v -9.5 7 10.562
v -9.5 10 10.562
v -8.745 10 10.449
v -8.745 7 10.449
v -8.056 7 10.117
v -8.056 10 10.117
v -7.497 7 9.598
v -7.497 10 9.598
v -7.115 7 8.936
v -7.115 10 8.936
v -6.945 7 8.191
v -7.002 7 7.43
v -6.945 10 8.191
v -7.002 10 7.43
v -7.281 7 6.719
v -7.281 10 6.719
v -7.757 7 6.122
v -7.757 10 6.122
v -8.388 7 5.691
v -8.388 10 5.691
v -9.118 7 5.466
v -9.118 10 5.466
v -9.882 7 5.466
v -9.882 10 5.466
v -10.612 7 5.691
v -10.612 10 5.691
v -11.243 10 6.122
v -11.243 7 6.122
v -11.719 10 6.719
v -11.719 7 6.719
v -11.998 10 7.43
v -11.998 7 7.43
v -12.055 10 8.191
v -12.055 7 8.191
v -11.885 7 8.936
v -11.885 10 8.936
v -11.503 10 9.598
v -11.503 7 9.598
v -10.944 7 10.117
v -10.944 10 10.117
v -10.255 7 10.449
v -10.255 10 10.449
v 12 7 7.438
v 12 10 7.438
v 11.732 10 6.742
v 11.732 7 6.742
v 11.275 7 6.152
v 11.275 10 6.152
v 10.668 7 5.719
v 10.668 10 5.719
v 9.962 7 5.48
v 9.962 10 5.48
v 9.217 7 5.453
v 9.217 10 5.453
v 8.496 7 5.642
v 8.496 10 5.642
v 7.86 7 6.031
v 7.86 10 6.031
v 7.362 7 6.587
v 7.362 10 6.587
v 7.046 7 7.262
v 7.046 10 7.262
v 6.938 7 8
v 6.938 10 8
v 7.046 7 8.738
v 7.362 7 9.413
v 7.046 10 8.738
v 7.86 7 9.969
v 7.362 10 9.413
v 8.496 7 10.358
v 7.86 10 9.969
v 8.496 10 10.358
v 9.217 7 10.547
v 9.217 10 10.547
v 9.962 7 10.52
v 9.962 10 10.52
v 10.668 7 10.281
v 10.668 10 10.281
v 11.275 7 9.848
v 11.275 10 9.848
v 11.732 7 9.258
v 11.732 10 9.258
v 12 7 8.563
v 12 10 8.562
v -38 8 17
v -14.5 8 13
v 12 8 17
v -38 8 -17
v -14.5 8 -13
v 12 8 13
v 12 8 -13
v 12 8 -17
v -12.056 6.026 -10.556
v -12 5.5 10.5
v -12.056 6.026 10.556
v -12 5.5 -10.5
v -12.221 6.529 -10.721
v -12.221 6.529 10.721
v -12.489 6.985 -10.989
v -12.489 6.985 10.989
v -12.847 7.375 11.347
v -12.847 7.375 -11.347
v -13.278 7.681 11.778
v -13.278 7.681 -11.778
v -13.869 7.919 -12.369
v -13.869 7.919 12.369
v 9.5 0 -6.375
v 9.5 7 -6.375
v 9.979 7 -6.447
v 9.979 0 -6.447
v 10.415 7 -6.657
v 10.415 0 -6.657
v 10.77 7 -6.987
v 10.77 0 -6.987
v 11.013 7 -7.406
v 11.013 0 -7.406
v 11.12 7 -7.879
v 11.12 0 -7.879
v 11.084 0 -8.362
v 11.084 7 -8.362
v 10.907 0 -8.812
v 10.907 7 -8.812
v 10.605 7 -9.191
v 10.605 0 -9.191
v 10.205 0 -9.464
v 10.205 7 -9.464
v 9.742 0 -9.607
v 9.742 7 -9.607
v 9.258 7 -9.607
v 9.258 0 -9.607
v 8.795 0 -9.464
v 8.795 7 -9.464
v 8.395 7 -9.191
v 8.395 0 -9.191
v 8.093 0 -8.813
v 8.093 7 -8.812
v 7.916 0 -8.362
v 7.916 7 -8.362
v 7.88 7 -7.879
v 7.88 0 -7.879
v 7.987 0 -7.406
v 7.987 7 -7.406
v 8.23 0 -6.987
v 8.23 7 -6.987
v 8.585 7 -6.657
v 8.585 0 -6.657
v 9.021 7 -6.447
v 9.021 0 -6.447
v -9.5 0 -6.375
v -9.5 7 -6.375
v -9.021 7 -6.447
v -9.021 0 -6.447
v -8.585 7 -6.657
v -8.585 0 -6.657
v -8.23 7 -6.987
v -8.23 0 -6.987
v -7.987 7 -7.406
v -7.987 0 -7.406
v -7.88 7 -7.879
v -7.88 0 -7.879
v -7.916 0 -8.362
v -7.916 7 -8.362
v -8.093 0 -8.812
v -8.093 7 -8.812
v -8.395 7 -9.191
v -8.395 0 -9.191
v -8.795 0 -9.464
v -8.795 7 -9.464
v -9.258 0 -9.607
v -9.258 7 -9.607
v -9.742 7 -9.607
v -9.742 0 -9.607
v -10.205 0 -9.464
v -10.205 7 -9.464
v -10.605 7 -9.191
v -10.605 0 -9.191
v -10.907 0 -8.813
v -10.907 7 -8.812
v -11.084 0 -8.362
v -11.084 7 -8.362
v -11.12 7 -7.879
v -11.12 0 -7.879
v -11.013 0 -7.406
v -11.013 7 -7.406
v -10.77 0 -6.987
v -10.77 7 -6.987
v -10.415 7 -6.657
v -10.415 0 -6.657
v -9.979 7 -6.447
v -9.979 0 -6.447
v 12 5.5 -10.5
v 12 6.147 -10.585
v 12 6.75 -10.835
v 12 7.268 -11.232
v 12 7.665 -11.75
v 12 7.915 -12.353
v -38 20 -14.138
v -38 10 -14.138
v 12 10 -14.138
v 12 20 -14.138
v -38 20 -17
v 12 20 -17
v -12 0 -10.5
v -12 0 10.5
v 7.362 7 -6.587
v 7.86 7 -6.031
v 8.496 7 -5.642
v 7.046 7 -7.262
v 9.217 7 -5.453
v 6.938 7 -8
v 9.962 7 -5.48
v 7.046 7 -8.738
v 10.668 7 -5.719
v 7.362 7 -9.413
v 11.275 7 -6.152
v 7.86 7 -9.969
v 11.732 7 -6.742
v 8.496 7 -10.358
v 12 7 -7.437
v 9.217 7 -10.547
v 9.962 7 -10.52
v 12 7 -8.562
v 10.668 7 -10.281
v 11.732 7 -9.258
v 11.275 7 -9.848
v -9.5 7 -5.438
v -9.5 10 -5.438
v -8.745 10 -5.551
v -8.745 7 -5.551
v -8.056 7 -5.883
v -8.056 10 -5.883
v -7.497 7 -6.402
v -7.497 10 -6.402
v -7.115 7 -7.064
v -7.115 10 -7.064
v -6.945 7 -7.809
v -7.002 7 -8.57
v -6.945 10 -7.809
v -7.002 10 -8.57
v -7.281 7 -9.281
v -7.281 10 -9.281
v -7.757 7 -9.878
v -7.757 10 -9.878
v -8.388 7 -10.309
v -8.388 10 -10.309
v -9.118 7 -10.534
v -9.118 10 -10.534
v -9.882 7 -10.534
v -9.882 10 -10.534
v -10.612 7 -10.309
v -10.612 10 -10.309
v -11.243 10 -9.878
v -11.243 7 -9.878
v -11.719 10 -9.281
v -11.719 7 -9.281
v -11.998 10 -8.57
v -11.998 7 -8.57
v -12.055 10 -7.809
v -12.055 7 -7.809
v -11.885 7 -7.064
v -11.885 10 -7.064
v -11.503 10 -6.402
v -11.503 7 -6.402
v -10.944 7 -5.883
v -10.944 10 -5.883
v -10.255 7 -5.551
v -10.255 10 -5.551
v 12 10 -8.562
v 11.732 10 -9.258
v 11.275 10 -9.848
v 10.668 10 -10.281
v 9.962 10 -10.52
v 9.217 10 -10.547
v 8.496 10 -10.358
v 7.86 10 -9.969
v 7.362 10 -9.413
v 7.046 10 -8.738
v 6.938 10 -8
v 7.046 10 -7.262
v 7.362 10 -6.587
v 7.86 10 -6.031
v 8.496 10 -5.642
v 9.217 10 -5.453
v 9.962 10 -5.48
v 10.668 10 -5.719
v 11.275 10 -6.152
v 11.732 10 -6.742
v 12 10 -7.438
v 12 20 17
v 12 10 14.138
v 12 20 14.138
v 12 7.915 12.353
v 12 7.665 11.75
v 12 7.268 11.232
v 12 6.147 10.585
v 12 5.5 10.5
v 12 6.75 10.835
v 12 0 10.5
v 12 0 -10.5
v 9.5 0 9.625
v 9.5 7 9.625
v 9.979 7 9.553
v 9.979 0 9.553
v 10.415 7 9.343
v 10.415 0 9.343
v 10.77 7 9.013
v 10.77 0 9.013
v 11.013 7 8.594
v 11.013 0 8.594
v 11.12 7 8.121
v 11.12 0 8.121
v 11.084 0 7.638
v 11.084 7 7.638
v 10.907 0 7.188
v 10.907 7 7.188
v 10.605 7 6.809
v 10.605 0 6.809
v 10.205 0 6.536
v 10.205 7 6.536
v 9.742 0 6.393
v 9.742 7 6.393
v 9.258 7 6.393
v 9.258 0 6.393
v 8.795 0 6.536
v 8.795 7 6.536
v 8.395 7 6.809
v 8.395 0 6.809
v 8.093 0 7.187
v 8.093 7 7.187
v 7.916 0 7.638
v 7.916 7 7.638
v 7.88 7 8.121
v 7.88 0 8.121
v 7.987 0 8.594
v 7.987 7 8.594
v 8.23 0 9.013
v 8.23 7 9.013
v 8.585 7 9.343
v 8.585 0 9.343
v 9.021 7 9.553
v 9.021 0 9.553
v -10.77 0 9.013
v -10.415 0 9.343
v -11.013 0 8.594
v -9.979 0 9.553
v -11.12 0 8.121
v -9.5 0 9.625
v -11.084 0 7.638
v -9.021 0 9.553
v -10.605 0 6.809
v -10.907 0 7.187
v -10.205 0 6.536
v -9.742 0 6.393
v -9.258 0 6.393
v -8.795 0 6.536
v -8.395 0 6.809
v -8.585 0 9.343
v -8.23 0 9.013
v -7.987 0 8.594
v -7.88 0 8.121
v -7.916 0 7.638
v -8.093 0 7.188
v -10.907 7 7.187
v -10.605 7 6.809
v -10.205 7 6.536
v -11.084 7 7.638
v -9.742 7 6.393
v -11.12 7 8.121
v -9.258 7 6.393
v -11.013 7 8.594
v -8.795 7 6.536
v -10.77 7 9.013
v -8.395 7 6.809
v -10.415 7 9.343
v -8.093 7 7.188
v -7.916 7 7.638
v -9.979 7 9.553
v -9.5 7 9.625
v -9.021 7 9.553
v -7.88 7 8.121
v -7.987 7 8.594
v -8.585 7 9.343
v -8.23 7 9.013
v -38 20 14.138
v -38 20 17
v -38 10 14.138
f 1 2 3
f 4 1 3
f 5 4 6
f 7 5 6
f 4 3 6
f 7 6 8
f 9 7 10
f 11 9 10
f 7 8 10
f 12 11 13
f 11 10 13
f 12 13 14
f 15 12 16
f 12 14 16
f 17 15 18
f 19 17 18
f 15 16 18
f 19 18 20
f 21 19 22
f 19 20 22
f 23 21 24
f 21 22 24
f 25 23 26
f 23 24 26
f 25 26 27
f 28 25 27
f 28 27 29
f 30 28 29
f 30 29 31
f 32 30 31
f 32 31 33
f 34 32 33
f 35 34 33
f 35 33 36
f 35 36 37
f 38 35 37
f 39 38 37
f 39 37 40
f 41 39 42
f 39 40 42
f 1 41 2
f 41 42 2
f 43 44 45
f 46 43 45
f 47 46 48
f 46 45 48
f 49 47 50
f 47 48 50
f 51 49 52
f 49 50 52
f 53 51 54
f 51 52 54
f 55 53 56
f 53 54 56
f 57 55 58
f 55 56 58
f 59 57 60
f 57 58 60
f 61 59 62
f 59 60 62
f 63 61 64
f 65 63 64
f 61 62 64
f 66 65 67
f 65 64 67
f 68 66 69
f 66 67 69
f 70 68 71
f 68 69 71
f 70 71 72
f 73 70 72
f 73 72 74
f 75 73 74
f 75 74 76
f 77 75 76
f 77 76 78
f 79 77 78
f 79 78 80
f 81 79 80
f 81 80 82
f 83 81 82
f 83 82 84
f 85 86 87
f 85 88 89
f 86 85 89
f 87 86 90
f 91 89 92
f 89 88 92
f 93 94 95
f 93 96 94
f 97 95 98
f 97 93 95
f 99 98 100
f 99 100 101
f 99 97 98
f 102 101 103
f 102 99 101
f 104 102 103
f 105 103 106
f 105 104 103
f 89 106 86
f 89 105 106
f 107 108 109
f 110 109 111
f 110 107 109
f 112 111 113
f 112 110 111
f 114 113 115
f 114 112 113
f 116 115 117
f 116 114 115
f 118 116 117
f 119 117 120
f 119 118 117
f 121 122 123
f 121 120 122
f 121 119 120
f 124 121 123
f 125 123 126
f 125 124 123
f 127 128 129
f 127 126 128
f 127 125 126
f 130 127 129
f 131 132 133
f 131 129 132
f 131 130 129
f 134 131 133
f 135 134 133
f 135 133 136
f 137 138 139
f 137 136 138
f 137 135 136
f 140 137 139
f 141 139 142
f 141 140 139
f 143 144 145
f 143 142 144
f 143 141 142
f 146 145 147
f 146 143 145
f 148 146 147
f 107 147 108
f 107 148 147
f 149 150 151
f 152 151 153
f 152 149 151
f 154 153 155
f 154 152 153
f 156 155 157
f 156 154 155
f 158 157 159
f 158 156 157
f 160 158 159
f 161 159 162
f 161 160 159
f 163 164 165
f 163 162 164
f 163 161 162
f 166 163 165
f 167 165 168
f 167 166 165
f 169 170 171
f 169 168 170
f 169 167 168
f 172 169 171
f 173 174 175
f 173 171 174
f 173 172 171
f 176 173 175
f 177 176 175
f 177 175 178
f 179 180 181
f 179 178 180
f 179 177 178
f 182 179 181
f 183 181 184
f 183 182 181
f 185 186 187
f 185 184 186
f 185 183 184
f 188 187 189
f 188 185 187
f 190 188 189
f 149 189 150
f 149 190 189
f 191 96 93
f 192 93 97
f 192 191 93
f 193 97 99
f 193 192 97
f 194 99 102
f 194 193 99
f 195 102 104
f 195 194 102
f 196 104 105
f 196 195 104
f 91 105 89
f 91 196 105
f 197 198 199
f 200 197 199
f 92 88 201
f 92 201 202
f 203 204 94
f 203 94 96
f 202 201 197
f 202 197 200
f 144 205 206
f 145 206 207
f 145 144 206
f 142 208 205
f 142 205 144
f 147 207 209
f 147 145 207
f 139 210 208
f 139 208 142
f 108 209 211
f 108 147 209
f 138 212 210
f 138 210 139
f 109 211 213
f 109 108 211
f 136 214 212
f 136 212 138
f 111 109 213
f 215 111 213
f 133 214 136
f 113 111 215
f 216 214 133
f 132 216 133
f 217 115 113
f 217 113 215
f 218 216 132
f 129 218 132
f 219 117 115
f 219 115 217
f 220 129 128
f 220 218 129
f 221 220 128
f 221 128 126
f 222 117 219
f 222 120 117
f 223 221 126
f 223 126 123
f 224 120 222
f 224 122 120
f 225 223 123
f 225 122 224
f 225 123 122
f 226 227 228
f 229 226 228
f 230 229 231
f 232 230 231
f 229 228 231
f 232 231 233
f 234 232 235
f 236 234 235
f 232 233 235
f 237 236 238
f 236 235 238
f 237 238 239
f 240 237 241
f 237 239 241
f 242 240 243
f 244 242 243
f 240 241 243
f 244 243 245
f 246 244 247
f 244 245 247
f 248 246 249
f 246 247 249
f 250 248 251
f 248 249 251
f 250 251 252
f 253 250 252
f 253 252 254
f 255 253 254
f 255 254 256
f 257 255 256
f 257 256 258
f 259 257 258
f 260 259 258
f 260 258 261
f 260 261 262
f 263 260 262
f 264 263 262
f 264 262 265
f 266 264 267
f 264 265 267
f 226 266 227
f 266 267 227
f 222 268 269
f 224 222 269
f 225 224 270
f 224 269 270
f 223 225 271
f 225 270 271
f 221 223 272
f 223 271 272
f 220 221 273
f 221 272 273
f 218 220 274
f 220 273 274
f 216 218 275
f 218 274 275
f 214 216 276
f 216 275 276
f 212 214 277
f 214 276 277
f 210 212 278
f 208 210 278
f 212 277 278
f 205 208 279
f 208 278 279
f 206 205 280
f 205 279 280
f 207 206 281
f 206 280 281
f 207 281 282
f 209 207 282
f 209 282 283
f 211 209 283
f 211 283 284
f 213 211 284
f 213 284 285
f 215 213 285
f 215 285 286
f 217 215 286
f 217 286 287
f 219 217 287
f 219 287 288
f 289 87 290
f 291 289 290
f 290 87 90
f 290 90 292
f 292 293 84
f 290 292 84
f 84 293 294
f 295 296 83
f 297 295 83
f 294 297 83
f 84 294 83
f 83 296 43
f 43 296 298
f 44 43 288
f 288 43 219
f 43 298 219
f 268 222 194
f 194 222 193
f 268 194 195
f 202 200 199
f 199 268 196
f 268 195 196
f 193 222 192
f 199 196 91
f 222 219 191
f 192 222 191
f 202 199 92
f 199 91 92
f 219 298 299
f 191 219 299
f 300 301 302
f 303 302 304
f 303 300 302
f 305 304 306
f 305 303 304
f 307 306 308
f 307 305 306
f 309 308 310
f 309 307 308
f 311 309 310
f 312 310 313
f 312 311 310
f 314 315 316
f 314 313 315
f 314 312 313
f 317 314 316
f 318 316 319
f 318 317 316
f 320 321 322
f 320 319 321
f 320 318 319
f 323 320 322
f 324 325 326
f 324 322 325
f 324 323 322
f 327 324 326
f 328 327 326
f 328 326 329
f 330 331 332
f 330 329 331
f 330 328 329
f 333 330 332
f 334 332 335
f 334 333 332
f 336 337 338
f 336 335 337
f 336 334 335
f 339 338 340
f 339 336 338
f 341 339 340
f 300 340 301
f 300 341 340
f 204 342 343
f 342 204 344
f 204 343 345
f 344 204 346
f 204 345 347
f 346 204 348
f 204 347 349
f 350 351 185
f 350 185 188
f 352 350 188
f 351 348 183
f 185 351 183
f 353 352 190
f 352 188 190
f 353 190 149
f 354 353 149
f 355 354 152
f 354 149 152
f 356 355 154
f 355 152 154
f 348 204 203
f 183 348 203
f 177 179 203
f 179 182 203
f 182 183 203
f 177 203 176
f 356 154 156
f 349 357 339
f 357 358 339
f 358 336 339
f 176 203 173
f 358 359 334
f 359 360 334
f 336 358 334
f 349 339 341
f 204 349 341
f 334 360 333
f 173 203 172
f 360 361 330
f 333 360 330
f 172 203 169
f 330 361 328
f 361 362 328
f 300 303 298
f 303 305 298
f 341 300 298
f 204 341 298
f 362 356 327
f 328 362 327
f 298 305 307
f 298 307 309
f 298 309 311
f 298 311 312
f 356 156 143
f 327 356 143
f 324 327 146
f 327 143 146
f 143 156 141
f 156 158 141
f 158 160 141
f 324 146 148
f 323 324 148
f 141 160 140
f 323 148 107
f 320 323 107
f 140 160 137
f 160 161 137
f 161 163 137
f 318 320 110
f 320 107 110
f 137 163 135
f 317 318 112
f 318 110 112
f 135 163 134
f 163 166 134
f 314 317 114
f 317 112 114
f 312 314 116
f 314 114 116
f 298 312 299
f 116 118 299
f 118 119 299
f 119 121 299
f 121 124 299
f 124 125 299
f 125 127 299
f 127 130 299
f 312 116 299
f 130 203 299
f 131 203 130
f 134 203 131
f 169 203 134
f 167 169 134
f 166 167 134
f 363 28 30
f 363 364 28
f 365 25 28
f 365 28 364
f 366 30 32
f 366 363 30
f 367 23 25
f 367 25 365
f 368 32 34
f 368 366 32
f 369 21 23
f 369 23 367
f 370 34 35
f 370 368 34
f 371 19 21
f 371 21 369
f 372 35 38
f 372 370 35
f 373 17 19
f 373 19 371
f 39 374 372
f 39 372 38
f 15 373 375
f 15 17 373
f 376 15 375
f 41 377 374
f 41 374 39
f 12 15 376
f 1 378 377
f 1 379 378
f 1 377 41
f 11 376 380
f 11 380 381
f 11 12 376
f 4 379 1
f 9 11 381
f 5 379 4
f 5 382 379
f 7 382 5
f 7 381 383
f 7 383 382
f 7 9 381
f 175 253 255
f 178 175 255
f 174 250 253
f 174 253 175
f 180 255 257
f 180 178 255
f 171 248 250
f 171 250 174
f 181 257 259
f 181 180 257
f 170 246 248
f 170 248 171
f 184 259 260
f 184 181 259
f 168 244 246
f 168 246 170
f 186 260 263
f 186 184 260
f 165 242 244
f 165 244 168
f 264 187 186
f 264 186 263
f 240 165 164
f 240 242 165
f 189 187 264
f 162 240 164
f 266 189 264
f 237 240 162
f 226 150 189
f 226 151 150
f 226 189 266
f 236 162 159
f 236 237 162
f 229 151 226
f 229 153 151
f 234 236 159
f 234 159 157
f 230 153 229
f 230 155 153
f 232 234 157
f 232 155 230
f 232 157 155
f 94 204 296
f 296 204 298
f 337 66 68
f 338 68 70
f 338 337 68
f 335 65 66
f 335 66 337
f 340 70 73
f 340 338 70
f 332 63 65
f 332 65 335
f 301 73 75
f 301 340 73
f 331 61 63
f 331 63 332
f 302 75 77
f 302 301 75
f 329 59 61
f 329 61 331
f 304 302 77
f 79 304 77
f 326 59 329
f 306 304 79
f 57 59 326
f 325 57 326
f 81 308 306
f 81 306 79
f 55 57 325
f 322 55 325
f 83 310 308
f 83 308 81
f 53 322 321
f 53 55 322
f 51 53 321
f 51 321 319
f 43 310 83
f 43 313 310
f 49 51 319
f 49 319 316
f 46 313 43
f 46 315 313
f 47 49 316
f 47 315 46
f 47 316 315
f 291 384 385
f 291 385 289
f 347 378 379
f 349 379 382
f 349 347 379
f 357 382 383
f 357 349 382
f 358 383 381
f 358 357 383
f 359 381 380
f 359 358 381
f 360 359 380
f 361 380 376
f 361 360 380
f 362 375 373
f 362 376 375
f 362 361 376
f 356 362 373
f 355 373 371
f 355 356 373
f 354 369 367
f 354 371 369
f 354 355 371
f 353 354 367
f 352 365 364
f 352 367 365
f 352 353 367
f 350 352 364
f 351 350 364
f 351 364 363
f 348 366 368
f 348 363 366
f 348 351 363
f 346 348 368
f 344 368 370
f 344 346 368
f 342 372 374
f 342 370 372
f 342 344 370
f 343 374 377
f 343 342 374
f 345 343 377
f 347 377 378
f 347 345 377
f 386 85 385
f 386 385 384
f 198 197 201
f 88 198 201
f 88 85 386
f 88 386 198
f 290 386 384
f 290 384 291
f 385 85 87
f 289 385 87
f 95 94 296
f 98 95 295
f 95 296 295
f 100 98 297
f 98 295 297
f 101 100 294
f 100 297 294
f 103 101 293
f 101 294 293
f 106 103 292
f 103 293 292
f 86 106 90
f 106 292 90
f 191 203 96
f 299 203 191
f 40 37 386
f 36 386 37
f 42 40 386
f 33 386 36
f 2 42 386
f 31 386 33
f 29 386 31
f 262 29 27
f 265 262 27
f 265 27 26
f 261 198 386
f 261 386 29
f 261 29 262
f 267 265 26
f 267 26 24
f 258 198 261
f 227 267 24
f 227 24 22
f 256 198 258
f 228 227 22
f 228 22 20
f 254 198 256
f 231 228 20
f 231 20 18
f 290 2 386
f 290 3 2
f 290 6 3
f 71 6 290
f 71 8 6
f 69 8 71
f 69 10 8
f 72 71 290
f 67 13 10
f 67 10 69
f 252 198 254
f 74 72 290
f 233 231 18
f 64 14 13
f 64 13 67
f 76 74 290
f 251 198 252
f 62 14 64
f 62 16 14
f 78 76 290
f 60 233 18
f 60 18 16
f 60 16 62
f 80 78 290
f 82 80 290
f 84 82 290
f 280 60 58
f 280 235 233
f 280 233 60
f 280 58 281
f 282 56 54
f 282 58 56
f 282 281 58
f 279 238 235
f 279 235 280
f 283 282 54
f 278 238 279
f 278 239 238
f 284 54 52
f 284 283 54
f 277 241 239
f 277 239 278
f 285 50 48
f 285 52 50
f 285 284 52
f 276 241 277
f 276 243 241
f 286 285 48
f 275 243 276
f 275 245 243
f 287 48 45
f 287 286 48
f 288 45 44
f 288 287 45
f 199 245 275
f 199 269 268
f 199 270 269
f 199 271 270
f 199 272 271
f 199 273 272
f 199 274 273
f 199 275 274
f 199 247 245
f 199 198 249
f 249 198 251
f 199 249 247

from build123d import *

# Parameters (mm, degrees)
SKETCH1_W           = 24
SKETCH1_H           = 21
SKETCH1_R           = 1.625
BOSS_EXTRUDE1_DEPTH = 8
SKETCH2_W           = 50
SKETCH2_H           = 34
SKETCH2_R           = 1.625
BOSS_EXTRUDE2_DEPTH = 2
FILLET2_R           = 2.5
SKETCH3_W           = 50
SKETCH3_H           = 2.861592732
BOSS_EXTRUDE3_DEPTH = 10
SKETCH4_R           = 2.5625
CUT_EXTRUDE3_DEPTH  = 3


with BuildPart() as part:
    # Sketch1 → Boss-Extrude1 (new body)
    with BuildSketch(Plane(origin=(0, 0, 0), x_dir=(1, 0, 0), z_dir=(0, 1, 0))):
        Rectangle(SKETCH1_W, SKETCH1_H)
        with Locations(Location((-9.5, 8, 0), (0, 0, 270))):
            Circle(SKETCH1_R, mode=Mode.SUBTRACT)
        with Locations(Location((9.5, 8, 0), (0, 0, 270))):
            Circle(SKETCH1_R, mode=Mode.SUBTRACT)
        with Locations(Location((9.5, -8, 0), (0, 0, 270))):
            Circle(SKETCH1_R, mode=Mode.SUBTRACT)
        with Locations(Location((-9.5, -8, 0), (0, 0, 270))):
            Circle(SKETCH1_R, mode=Mode.SUBTRACT)
    extrude(amount=BOSS_EXTRUDE1_DEPTH)

    # Sketch2 → Boss-Extrude2 (add)
    with BuildSketch(Plane(origin=(0, 8, 0), x_dir=(1, 0, 0), z_dir=(0, 1, 0))):
        with Locations((-13, 0)):
            Rectangle(SKETCH2_W, SKETCH2_H)
        with Locations(Location((9.5, -8, 0), (0, 0, 270))):
            Circle(SKETCH2_R, mode=Mode.SUBTRACT)
        with Locations(Location((-9.5, -8, 0), (0, 0, 270))):
            Circle(SKETCH2_R, mode=Mode.SUBTRACT)
        with Locations(Location((9.5, 8, 0), (0, 0, 270))):
            Circle(SKETCH2_R, mode=Mode.SUBTRACT)
        with Locations(Location((-9.5, 8, 0), (0, 0, 270))):
            Circle(SKETCH2_R, mode=Mode.SUBTRACT)
    extrude(amount=BOSS_EXTRUDE2_DEPTH)

    # Fillet2
    fillet2_edges = [part.edges().sort_by_distance(p)[0] for p in [
        (0, 8, -10.5),
        (-12, 8, 0),
        (0, 8, 10.5),
    ]]
    fillet(fillet2_edges, radius=FILLET2_R)

    # Sketch3 → Boss-Extrude3 (add)
    with BuildSketch(Plane(origin=(0, 10, 0), x_dir=(1, 0, 0), z_dir=(0, 1, 0))):
        with Locations((-13, 15.569203634)):
            Rectangle(SKETCH3_W, SKETCH3_H)
        with Locations((-13, -15.569203634)):
            Rectangle(SKETCH3_W, SKETCH3_H)
    extrude(amount=BOSS_EXTRUDE3_DEPTH)

    # Sketch4 → Cut-Extrude3 (cut)
    with BuildSketch(Plane(origin=(0, 10, 0), x_dir=(1, 0, 0), z_dir=(0, 1, 0))):
        with Locations(Location((-9.5, 8, 0), (0, 0, 270))):
            Circle(SKETCH4_R)
        with Locations((9.5, 8)):
            Circle(SKETCH4_R)
        with Locations((9.5, -8)):
            Circle(SKETCH4_R)
        with Locations(Location((-9.5, -8, 0), (0, 0, 270))):
            Circle(SKETCH4_R)
    extrude(amount=-CUT_EXTRUDE3_DEPTH, mode=Mode.SUBTRACT)


solid = part.part
